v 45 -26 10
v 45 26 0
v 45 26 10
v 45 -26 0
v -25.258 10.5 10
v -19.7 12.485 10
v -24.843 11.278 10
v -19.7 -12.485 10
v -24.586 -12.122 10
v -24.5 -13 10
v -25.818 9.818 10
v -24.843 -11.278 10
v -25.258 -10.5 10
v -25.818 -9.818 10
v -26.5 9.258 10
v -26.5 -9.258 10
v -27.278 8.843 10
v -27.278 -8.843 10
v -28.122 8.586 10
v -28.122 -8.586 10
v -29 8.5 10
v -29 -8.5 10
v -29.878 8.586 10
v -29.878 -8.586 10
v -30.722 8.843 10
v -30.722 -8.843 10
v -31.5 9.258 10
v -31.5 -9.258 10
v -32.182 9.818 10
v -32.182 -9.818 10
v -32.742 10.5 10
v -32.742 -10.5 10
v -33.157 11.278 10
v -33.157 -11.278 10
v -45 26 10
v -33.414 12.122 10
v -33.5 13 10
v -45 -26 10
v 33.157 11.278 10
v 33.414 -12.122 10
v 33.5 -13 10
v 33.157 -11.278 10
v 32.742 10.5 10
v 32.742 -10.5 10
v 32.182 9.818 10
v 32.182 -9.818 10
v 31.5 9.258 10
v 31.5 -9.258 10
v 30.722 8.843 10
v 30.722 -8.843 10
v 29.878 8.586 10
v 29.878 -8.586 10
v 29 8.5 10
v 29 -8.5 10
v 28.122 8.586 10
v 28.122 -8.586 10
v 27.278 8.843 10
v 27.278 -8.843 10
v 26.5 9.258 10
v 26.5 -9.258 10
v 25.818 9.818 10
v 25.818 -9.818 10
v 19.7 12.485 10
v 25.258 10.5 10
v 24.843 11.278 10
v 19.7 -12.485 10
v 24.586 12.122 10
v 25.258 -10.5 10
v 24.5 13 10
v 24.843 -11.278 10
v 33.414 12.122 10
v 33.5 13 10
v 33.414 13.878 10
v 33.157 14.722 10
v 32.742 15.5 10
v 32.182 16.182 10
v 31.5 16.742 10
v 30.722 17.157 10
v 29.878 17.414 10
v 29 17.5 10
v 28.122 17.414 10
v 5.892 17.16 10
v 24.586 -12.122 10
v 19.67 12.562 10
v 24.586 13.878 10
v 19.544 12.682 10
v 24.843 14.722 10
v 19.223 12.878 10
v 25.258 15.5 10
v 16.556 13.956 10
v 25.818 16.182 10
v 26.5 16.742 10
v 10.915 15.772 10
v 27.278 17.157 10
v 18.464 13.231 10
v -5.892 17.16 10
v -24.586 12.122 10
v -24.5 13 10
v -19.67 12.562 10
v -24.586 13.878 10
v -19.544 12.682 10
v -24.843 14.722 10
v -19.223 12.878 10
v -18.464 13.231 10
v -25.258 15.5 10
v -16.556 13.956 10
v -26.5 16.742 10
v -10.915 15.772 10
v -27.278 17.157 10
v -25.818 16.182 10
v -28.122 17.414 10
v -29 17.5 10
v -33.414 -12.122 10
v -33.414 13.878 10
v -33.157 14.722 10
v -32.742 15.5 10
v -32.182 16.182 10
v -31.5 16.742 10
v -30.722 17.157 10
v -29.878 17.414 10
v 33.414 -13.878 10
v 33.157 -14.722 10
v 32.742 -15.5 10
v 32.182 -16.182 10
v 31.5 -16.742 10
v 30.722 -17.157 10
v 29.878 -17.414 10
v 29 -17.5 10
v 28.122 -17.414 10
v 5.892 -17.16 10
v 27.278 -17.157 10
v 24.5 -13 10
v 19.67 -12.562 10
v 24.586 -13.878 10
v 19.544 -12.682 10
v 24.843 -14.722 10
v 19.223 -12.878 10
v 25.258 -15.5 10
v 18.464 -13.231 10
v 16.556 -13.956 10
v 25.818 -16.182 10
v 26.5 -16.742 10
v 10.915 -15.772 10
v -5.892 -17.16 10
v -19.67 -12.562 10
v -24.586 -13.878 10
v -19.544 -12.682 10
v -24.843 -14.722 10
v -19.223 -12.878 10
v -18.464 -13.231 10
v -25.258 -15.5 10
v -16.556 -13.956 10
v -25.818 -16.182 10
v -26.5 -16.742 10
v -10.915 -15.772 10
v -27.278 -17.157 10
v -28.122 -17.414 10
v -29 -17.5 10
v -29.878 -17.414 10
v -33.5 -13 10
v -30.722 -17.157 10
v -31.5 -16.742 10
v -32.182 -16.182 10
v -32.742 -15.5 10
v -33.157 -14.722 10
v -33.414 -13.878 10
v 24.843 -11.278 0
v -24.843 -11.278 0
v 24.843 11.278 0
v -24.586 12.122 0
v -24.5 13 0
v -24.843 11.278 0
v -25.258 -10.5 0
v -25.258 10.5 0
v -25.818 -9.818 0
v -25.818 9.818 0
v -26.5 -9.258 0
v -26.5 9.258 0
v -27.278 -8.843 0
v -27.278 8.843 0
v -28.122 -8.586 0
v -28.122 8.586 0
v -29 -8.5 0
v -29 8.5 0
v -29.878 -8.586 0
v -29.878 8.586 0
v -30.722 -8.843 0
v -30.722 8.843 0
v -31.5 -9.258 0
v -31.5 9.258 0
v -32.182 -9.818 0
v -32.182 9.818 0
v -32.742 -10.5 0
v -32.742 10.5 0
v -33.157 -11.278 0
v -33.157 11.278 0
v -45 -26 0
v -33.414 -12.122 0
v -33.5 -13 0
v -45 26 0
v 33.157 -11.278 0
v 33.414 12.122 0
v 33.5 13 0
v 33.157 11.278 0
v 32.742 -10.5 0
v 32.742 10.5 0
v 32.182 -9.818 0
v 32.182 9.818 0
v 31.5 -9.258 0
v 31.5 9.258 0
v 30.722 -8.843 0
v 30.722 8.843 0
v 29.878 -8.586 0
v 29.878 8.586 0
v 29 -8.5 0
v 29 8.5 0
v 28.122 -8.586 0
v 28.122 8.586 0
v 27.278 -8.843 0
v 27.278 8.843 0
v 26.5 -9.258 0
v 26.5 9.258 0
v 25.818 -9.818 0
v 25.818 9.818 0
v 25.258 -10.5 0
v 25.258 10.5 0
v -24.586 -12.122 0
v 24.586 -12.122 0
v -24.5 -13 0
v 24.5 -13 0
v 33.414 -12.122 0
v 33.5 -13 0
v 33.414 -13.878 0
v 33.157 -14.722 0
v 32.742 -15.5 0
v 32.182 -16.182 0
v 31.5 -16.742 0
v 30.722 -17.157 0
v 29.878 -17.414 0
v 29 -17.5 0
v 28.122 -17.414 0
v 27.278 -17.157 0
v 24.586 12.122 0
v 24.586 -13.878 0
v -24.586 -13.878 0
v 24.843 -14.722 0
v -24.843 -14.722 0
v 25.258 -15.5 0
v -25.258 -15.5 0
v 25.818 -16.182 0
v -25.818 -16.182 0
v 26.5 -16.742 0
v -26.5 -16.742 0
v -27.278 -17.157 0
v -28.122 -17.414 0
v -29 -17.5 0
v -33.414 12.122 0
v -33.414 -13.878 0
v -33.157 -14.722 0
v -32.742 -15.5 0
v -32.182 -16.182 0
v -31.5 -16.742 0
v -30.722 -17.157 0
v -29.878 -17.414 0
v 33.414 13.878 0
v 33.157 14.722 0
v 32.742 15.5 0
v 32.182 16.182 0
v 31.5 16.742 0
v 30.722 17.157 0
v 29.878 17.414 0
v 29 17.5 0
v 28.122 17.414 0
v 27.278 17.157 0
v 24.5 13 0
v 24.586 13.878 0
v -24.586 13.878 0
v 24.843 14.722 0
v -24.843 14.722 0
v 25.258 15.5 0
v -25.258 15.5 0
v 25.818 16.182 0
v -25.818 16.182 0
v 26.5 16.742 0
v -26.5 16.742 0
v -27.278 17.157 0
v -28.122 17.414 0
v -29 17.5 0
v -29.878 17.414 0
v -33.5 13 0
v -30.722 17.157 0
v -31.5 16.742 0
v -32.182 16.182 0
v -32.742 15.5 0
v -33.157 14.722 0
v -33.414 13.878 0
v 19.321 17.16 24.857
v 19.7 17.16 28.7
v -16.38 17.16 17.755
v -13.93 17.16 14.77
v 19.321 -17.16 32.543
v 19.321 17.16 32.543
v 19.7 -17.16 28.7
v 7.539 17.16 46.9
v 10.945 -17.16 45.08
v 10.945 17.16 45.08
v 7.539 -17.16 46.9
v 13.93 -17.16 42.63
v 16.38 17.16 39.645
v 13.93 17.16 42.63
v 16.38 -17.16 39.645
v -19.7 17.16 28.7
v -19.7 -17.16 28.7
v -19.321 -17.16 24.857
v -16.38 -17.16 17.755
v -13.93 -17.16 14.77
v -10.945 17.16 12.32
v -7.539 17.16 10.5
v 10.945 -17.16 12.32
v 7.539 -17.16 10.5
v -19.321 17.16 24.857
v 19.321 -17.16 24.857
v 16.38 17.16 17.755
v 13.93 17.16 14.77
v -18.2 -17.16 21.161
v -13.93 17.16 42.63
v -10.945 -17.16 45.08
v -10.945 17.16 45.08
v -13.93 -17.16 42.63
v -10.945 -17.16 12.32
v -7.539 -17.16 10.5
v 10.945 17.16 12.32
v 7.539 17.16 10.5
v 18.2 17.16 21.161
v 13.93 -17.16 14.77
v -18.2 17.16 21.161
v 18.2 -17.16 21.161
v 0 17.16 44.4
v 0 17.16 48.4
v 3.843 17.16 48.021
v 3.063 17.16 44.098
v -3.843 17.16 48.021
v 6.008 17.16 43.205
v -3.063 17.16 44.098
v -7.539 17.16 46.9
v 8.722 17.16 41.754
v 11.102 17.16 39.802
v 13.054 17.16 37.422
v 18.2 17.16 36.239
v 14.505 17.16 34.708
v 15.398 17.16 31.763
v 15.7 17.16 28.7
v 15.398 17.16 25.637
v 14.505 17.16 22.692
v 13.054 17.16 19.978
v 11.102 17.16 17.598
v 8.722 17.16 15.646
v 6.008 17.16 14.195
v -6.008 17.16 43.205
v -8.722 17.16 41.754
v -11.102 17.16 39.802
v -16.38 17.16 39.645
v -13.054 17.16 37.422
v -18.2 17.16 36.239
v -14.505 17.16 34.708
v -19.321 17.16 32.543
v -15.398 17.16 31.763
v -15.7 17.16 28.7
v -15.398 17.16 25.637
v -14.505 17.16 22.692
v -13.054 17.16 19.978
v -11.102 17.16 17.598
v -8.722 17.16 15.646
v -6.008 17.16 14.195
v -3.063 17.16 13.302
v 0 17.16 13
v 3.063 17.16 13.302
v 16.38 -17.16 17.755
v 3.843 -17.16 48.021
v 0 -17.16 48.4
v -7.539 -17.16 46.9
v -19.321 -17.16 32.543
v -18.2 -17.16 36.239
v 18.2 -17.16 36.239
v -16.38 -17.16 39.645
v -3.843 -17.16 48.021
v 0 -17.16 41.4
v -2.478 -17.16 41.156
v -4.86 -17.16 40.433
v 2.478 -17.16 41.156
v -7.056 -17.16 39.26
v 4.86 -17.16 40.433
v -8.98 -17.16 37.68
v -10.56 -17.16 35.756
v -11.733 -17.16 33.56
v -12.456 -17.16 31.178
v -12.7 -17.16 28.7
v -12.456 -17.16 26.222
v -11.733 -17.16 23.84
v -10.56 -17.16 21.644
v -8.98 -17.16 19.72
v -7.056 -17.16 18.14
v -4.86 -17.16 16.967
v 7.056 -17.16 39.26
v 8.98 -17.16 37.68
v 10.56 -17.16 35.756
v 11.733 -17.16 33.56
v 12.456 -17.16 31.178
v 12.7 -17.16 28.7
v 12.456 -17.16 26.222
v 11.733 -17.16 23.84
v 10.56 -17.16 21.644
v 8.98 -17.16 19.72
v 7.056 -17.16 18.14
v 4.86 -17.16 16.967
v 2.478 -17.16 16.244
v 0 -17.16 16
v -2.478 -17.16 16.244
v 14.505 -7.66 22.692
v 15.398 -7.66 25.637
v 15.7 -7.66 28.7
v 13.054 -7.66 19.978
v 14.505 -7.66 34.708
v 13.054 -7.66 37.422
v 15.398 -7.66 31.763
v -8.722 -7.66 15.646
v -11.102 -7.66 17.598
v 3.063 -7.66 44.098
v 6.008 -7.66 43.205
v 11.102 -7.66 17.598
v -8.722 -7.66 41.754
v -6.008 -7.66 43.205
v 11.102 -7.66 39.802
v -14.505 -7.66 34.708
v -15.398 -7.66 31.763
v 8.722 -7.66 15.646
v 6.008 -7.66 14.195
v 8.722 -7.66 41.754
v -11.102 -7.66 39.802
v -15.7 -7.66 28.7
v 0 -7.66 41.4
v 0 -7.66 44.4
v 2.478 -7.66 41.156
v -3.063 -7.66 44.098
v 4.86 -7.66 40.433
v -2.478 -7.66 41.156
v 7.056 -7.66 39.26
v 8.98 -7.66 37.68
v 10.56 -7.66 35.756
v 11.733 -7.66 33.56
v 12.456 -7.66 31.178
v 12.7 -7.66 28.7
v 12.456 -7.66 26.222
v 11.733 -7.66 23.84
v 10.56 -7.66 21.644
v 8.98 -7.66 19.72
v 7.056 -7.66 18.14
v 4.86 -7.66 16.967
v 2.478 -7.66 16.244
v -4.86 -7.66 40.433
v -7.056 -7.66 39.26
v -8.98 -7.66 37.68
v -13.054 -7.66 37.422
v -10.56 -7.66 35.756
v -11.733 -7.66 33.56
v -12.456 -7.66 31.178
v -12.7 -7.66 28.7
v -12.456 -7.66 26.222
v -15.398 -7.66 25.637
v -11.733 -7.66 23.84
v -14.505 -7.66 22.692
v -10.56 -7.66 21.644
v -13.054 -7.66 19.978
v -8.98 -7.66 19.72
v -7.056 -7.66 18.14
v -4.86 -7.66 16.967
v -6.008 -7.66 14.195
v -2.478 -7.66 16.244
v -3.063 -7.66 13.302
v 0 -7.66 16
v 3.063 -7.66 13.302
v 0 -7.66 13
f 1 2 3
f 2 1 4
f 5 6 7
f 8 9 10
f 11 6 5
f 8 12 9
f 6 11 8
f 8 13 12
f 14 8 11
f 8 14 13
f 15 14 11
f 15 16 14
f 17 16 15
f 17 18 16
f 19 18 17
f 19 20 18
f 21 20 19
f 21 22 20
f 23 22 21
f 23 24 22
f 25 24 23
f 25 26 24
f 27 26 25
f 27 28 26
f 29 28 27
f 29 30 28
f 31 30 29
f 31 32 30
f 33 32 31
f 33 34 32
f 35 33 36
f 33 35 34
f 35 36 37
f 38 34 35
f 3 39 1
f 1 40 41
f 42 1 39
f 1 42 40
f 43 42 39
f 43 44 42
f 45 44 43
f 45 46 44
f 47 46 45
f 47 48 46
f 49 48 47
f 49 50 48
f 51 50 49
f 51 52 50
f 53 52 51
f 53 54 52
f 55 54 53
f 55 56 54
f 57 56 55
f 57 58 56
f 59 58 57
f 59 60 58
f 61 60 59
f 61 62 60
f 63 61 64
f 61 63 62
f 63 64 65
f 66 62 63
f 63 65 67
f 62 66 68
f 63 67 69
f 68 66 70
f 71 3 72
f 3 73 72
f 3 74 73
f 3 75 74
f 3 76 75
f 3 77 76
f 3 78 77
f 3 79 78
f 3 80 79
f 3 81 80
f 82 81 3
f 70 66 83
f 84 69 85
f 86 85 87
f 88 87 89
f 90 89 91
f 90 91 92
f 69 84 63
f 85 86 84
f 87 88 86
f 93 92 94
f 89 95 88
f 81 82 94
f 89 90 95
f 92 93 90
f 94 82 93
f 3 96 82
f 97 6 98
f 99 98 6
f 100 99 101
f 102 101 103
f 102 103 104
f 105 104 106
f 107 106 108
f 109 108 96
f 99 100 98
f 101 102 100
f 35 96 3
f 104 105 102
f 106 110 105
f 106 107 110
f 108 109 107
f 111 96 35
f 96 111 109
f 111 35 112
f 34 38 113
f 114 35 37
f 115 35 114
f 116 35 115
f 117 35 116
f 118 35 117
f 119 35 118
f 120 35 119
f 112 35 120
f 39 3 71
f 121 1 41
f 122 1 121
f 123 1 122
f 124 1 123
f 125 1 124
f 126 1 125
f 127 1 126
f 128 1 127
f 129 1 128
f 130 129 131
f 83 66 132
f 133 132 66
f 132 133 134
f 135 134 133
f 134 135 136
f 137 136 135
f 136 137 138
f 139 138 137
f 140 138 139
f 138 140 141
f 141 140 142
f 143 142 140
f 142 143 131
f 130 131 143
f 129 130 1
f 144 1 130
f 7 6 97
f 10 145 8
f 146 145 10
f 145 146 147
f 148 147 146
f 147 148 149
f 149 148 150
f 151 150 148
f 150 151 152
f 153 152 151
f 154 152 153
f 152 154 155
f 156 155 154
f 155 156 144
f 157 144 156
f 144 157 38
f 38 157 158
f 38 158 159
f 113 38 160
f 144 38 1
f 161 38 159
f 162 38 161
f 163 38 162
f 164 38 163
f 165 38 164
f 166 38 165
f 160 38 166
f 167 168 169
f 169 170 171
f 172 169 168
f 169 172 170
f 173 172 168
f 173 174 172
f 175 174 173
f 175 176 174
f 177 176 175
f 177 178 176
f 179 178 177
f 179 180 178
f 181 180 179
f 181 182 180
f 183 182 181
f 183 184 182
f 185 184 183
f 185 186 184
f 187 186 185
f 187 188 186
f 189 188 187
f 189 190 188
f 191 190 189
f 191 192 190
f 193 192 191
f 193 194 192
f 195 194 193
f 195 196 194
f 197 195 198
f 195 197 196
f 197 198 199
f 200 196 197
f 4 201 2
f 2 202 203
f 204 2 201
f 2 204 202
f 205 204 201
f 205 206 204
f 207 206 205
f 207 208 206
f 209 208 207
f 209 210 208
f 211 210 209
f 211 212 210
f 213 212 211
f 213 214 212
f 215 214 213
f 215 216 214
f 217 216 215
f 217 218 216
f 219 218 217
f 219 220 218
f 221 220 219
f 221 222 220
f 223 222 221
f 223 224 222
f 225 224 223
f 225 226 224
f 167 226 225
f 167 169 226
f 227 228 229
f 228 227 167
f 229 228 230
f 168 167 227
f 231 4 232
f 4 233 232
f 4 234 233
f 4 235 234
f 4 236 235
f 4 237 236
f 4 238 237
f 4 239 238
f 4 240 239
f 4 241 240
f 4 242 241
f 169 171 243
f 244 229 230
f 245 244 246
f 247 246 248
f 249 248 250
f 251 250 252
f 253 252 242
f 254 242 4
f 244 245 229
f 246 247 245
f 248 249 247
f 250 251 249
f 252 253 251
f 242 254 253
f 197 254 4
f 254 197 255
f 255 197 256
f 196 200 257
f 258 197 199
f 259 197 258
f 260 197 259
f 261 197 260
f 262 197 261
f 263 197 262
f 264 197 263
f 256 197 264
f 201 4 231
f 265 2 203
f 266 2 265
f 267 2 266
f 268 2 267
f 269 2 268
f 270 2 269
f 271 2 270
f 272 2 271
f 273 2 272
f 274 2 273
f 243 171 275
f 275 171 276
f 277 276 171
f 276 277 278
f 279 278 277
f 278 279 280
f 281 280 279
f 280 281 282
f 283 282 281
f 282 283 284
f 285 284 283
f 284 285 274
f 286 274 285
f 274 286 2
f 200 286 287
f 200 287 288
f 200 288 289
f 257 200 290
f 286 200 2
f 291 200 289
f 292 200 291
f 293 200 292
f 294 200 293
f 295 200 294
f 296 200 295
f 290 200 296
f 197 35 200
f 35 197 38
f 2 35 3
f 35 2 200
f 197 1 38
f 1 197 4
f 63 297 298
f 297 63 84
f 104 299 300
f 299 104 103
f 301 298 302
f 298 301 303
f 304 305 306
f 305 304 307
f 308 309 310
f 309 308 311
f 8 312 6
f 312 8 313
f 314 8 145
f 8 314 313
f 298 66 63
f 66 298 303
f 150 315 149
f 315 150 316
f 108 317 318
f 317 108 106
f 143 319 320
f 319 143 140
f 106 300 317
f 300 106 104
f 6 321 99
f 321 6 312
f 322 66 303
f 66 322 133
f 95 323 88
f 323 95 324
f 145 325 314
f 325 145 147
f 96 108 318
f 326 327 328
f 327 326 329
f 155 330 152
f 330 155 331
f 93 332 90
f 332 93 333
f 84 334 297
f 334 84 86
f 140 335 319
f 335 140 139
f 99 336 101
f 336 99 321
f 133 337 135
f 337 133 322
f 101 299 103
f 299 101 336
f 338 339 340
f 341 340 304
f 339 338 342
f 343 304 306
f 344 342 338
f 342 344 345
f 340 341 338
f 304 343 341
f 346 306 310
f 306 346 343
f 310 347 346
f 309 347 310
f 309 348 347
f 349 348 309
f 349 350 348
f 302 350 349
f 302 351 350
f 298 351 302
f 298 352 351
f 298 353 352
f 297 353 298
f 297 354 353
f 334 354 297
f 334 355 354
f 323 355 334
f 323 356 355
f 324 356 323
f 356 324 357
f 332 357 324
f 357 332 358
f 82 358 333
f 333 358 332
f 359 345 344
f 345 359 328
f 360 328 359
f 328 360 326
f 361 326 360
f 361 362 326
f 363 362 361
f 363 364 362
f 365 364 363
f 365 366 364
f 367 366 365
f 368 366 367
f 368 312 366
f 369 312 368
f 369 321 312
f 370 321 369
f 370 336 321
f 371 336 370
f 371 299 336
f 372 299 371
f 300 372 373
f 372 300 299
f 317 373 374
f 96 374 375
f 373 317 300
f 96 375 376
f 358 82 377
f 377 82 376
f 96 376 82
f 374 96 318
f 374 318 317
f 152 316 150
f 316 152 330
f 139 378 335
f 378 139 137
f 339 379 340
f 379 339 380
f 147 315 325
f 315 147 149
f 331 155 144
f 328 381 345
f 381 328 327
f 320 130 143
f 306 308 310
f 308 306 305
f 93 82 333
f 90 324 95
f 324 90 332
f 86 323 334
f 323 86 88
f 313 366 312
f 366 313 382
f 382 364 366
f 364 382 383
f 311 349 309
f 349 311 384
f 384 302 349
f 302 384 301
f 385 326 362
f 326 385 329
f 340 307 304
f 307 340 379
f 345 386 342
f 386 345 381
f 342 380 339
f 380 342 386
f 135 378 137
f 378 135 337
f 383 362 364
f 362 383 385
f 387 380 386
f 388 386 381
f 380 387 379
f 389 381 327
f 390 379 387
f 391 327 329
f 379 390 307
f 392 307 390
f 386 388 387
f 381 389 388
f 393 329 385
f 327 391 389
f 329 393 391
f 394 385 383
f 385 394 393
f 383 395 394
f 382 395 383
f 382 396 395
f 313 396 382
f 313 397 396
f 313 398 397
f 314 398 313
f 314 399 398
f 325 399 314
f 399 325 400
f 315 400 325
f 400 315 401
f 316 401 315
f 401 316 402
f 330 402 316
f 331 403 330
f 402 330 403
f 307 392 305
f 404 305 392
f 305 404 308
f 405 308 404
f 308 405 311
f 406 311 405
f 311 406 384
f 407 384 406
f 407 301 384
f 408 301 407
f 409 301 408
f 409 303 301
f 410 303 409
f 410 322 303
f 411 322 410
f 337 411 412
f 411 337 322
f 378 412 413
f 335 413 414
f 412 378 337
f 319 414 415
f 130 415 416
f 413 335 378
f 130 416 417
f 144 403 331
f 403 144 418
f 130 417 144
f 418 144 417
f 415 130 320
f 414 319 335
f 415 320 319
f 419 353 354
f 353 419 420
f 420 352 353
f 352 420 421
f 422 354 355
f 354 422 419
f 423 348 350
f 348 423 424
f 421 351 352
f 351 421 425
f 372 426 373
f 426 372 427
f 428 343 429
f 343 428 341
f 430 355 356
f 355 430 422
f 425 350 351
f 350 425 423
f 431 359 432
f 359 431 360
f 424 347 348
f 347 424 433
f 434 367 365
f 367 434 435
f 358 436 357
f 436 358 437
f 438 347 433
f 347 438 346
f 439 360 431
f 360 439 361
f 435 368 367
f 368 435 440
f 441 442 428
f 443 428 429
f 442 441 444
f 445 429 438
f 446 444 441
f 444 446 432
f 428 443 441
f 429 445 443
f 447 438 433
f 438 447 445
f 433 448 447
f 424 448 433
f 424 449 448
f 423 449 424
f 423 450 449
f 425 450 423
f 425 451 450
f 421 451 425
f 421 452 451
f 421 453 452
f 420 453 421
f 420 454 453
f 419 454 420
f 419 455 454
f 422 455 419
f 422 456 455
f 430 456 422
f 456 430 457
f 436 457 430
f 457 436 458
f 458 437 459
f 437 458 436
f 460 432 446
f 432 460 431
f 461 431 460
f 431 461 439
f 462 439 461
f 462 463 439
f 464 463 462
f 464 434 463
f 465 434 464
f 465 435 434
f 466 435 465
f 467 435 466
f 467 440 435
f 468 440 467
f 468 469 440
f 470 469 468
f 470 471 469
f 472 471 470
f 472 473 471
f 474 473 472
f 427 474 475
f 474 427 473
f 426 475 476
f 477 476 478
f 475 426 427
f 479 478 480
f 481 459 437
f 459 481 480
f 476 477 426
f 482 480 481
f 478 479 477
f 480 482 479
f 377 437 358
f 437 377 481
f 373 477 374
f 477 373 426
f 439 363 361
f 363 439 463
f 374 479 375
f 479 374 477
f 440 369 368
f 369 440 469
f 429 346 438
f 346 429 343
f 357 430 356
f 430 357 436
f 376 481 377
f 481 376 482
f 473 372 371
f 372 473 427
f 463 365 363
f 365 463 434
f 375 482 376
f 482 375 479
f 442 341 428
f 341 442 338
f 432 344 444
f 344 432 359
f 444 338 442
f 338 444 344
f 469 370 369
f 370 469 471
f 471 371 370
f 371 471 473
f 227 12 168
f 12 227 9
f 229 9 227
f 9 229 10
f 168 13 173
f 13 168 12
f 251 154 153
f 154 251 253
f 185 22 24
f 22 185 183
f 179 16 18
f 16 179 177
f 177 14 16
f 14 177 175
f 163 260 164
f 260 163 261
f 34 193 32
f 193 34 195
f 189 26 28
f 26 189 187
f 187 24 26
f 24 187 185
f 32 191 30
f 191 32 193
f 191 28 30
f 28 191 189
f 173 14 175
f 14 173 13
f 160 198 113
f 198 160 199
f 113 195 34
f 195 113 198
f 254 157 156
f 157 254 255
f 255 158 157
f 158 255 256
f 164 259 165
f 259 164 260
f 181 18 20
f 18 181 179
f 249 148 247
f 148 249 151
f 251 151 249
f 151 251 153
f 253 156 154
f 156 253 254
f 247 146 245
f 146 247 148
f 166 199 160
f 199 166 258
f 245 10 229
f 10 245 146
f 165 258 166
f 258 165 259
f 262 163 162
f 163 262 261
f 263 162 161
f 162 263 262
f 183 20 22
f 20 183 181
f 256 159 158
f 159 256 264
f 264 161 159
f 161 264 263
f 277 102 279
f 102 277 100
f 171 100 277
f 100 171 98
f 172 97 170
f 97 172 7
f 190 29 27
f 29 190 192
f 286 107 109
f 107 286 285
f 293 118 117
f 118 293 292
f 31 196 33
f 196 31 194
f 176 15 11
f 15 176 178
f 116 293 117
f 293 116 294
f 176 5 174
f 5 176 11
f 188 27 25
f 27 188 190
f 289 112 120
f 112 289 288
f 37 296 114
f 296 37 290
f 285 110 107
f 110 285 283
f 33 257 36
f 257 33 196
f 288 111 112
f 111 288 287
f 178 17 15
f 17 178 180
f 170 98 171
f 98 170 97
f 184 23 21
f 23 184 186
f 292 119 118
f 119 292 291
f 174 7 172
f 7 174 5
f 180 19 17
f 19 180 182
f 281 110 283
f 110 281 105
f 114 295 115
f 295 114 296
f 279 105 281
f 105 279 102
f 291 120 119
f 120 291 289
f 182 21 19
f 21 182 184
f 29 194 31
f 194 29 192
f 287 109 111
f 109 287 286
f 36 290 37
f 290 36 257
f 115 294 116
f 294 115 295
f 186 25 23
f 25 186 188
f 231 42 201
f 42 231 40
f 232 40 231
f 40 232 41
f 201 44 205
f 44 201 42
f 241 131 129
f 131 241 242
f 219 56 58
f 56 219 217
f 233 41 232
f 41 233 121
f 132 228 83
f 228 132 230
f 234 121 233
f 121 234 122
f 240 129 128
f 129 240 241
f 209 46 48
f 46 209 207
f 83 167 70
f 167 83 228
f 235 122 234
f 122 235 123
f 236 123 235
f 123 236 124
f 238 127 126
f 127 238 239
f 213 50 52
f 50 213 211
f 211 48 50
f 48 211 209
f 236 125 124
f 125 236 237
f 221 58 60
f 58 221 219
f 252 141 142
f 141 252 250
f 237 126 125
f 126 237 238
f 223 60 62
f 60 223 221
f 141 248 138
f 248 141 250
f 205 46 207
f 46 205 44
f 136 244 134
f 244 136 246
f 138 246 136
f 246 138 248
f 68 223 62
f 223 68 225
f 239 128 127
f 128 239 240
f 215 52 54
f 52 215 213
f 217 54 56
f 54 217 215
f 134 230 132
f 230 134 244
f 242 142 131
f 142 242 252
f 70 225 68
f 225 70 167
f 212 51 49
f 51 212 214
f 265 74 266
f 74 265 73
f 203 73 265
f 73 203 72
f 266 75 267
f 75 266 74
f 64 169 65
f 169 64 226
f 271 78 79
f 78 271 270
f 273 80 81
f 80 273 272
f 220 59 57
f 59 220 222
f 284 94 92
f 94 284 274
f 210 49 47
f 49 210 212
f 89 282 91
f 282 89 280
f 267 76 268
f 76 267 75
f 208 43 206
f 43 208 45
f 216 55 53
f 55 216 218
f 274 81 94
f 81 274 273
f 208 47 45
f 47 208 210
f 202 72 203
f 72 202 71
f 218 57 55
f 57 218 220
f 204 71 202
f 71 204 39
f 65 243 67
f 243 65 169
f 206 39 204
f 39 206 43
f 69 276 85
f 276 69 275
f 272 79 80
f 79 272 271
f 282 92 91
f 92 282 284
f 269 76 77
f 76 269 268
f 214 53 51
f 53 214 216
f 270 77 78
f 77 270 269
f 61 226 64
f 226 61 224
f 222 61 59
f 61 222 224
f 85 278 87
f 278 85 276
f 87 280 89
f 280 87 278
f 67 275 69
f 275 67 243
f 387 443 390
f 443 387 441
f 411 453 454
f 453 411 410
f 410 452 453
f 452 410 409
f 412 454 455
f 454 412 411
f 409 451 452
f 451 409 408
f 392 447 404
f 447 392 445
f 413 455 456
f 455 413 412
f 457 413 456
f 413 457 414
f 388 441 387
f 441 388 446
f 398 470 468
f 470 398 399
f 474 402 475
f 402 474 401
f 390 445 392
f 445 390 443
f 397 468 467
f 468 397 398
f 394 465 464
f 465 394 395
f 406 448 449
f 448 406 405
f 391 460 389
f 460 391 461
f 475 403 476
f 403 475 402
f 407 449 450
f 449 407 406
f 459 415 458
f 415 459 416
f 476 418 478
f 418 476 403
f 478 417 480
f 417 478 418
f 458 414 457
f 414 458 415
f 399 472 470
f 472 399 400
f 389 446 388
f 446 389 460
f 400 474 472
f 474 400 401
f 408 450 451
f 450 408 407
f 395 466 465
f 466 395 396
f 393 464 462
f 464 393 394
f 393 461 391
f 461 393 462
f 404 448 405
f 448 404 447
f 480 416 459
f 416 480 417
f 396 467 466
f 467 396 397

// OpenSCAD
$fn = 32;

// ----------------------------------------------------------------------
// Bearing block: 90 x 52 mm base, 25.4 mm bore at 28.7 mm
// ----------------------------------------------------------------------

// --- parameters (mm) ---
base_w = 90;              // base width
base_d = 52;              // base depth
base_t = 10;              // base thickness
bore_d = 25.4;            // shaft / bearing bore
house_r = 19.7;           // housing outer radius
house_len = 34.32;        // housing length along the shaft
foot_w = 39.4;            // foot width under the housing
foot_len = 24.32;         // foot length along the shaft
axis_z = 28.7;            // bore axis height above the base
holes_d = 9;              // mounting holes
hole_x = 29;              // mounting hole spacing
seat_d = 12;              // bearing seat depth
seat_wall = 3;            // seat wall thickness

difference() {
  union() {
    /* base plate with its underside on z = 0 */
    translate([0, 0, base_t / 2]) cube([base_w, base_d, base_t], center = true);
    /* hull foot: a straight web blending into the round housing */
    hull() {
      translate([0, 0, base_t - 0.5]) cube([foot_w, foot_len, 1.6], center = true);
      translate([0, 0, axis_z]) rotate([-90, 0, 0]) cylinder(h = house_len, d = 2 * house_r, center = true);
    }
  }
  /* bore through the housing, 2.5 mm clear on both sides */
  translate([0, 0, axis_z]) rotate([-90, 0, 0]) cylinder(h = house_len + 5, d = bore_d, center = true);
  /* bearing seats, recessed into both ends of the housing */
  for (sy = [-1, 1]) {
    translate([0, sy * (house_len / 2 - seat_d + 2.5), axis_z]) rotate([-90, 0, 0]) cylinder(h = seat_d + 5, d = bore_d + 2 * seat_wall);
  }
  /* mounting holes through the base plate */
  for (hx = [-29, 29]) {
    for (hy = [-13, 13]) {
      translate([hx, hy, -2.5]) cylinder(h = base_t + 5, d = holes_d);
    }
  }
}
